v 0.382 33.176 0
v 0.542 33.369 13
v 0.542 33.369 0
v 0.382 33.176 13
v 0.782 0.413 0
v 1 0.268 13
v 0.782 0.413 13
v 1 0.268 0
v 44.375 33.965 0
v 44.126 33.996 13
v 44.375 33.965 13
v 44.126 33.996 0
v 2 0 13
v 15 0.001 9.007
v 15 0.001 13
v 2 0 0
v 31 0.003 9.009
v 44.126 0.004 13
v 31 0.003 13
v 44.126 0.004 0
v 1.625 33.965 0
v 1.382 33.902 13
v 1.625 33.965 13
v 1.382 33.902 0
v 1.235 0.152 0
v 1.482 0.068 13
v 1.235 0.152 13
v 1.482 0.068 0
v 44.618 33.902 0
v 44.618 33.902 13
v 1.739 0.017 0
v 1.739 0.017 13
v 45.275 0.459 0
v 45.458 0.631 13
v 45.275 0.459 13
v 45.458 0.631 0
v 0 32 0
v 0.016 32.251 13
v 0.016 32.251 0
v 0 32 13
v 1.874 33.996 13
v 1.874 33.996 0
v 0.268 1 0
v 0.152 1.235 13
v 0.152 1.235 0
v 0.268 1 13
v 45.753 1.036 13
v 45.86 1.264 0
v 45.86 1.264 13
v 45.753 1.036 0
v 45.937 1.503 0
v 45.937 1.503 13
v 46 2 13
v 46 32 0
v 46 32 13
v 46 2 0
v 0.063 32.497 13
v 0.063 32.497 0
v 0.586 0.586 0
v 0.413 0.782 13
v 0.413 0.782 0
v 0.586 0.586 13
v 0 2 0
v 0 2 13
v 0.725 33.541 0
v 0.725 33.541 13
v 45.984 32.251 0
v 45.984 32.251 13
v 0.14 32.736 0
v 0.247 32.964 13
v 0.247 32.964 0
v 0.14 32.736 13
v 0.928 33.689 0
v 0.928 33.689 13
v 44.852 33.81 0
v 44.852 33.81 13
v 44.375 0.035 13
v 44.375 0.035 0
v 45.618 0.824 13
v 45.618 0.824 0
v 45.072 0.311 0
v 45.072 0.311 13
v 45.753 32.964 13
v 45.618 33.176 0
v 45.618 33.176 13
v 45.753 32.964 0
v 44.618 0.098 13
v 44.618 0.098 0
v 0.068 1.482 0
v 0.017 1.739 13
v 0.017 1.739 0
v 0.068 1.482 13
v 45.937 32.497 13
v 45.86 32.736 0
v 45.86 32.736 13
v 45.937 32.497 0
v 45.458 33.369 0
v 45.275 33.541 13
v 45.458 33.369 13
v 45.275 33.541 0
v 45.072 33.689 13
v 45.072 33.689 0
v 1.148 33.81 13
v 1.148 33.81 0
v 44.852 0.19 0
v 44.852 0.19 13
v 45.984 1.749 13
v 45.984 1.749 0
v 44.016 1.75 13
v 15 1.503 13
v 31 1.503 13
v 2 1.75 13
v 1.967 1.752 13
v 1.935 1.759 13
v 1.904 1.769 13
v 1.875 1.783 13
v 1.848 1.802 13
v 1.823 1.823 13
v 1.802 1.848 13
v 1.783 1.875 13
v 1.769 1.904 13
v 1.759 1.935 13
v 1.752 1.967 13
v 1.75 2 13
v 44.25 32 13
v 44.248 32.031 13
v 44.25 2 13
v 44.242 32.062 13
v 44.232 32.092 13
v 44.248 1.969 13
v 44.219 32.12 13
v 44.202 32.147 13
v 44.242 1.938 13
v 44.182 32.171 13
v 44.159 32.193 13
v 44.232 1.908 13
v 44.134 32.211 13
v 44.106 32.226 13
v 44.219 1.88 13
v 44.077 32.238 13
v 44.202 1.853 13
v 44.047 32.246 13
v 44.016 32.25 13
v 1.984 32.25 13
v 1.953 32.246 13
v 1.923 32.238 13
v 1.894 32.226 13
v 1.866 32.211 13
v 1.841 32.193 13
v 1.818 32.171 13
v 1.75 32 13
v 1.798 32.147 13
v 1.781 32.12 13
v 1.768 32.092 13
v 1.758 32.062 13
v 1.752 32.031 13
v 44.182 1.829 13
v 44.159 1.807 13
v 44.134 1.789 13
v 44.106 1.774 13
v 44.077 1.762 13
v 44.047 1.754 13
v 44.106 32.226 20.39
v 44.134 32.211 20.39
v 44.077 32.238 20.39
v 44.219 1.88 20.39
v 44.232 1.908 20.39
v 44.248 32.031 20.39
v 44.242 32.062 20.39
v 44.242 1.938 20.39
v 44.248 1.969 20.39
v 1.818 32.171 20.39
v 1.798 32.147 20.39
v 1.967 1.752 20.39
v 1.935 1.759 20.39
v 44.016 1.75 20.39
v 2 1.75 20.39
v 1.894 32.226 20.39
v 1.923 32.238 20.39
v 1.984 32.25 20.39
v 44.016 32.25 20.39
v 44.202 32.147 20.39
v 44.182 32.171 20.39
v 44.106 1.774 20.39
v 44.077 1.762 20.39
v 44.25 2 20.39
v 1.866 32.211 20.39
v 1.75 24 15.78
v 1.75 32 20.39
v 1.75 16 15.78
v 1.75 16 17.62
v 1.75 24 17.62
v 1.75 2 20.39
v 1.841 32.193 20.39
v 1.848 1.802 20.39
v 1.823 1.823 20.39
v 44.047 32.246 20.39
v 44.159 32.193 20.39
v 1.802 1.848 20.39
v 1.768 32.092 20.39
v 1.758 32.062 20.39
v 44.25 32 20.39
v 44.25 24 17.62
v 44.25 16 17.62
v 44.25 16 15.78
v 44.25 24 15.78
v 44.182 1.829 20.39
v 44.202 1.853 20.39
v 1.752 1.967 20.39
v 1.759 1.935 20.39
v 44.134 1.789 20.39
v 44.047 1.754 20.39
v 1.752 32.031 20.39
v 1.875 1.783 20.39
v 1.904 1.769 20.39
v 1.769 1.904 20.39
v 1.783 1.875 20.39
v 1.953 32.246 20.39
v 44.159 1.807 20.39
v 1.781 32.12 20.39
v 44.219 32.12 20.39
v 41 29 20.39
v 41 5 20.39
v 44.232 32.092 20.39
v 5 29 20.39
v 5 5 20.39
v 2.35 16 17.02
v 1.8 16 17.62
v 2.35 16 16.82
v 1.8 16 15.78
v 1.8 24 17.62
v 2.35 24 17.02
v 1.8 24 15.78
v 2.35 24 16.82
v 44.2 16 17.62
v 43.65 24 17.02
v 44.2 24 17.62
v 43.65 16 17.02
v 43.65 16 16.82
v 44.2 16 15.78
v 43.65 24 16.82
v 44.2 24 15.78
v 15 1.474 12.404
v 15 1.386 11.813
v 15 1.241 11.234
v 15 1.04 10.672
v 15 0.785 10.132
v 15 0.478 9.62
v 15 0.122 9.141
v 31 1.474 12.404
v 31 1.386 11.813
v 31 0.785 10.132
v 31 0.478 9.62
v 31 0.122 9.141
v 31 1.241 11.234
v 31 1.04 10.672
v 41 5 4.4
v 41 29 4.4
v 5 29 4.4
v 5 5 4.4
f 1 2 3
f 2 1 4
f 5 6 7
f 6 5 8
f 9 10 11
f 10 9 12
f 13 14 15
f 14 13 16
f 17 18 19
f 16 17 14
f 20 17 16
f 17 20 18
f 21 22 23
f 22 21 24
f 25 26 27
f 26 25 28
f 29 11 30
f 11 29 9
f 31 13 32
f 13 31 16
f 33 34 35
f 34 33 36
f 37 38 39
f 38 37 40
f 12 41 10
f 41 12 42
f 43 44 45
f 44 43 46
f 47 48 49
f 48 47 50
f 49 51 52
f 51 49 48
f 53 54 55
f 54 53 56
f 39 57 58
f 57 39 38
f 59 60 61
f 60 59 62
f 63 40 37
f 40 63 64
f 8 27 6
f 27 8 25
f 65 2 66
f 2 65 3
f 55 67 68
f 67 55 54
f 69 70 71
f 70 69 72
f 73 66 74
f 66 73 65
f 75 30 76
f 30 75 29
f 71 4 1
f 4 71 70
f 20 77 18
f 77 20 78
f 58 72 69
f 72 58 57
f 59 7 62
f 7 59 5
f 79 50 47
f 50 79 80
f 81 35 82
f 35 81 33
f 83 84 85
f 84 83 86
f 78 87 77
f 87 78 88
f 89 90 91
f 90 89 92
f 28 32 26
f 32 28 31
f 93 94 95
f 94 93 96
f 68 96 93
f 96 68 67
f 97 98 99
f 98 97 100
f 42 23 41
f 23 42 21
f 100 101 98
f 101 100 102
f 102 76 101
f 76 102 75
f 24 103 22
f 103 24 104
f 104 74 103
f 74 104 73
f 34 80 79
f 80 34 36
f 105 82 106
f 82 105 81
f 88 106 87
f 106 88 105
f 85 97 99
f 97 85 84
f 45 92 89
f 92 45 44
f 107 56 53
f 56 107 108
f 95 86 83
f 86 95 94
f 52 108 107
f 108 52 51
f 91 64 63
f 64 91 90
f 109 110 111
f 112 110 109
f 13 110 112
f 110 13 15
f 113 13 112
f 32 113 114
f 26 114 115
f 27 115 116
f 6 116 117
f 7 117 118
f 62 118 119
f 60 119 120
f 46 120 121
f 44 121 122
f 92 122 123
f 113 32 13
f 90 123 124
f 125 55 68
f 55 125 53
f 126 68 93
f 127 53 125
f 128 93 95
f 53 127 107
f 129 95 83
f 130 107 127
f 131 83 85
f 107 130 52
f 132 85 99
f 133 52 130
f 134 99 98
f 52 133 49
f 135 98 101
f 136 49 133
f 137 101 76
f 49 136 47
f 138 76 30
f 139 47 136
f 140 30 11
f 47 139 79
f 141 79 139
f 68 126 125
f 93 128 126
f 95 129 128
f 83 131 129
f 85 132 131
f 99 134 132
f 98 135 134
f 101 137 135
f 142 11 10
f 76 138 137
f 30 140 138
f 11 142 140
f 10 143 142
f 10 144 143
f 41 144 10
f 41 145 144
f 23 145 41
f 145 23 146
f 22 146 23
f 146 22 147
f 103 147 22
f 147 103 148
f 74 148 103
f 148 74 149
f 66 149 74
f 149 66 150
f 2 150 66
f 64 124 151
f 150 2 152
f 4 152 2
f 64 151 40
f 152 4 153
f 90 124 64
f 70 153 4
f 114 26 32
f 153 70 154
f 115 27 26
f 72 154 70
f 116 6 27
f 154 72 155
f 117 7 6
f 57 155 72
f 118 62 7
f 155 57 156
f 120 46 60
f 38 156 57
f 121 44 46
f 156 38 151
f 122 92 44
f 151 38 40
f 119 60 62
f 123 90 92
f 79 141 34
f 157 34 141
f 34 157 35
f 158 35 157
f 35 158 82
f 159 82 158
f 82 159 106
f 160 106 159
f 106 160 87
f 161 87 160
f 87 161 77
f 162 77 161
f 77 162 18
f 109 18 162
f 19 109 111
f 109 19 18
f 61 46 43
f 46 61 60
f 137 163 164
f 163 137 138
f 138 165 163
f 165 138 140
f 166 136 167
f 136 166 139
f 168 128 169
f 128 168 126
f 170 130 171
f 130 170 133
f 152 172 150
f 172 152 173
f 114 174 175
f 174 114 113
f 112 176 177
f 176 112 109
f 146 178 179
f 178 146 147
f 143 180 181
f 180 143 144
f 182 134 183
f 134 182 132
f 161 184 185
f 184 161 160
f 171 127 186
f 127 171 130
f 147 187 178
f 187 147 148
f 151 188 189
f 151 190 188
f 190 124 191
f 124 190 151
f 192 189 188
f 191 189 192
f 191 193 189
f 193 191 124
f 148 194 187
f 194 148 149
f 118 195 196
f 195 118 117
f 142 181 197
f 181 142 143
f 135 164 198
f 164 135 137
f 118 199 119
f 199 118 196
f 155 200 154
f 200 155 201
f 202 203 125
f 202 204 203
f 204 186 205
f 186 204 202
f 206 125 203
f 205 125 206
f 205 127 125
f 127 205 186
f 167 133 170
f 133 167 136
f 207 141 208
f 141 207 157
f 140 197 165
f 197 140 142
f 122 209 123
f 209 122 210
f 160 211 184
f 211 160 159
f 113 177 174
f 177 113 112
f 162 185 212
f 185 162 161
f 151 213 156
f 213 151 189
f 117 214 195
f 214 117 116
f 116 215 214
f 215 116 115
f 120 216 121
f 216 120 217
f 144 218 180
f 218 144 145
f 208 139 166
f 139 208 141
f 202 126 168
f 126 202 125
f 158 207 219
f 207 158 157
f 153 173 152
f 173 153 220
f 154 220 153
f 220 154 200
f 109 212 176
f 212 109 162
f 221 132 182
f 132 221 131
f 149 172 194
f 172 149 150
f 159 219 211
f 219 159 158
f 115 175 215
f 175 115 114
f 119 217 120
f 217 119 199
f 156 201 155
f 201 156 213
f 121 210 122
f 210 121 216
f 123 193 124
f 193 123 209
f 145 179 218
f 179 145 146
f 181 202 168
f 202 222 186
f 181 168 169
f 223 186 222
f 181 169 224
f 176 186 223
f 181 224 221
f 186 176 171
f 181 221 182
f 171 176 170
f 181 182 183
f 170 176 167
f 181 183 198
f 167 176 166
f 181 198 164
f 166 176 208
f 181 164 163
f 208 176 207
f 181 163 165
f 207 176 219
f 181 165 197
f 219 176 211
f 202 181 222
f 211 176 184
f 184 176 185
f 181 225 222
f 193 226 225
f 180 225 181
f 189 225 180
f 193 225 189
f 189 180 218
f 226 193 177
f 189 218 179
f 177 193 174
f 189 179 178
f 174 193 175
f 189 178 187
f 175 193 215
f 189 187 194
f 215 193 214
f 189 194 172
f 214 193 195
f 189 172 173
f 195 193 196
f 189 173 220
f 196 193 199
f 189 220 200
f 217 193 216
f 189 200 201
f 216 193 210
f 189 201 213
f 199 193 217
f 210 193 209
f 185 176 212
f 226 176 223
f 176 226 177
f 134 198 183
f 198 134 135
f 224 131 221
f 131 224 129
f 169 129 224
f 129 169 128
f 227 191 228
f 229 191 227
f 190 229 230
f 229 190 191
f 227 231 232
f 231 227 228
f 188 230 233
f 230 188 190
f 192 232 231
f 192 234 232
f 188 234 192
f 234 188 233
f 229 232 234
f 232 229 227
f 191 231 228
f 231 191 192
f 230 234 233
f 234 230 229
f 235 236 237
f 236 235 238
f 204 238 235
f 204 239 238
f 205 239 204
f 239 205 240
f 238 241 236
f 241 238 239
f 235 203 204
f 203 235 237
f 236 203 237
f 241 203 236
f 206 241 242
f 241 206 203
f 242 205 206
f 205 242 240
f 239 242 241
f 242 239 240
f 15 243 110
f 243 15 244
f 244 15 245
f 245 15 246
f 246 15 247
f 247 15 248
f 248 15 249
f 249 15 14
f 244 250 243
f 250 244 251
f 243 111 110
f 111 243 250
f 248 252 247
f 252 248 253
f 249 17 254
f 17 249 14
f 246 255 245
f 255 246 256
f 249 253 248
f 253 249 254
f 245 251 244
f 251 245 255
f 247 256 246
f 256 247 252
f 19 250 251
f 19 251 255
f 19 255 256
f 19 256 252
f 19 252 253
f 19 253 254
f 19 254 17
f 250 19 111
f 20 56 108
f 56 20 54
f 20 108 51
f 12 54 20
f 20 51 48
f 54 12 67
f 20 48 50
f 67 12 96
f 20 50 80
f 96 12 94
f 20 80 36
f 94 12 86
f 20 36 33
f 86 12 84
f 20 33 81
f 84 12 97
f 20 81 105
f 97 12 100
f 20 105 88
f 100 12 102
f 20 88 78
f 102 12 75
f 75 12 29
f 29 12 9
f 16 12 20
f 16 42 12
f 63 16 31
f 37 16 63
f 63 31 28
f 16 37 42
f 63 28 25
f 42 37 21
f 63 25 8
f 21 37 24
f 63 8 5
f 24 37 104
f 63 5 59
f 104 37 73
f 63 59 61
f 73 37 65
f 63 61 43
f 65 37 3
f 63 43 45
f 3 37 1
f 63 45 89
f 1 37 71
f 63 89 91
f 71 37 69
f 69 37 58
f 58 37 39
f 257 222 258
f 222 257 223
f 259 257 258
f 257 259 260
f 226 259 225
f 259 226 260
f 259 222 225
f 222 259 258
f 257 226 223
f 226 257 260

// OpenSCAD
$fn=48;
translate([0,0,0])
{
difference()
{
    translate(v = [2.00, 2.00, 0.00])
    {
        hull()
        {
            cylinder(center = false, r1 = 2, r2 = 2, h = 22);
            translate(v = [42.00, 0.00, 0.00])
            {
                cylinder(center = false, r1 = 2, r2 = 2, h = 22, $fn = 50);
            }
            translate(v = [0.00, 30.00, 0.00])
            {
                cylinder(center = false, r1 = 2, r2 = 2, h = 22, $fn = 50);
            }
            translate(v = [42.00, 30.00, 0.00])
            {
                cylinder(center = false, r1 = 2, r2 = 2, h = 22, $fn = 50);
            }
        }
    }
    translate(v = [0.00, 0.00, 13.00])
    {
        union()
        {
            union()
            {
                difference()
                {
                    translate(v = [2.00, 2.00, 0.00])
                    {
                        hull()
                        {
                            cylinder(center = false, r1 = 2, r2 = 2, h = 9);
                            translate(v = [42.00, 0.00, 0.00])
                            {
                                cylinder(center = false, r1 = 2, r2 = 2, h = 9, $fn = 50);
                            }
                            translate(v = [0.00, 30.00, 0.00])
                            {
                                cylinder(center = false, r1 = 2, r2 = 2, h = 9, $fn = 50);
                            }
                            translate(v = [42.00, 30.00, 0.00])
                            {
                                cylinder(center = false, r1 = 2, r2 = 2, h = 9, $fn = 50);
                            }
                        }
                    }
                    translate(v = [1.75, 1.75, -0.01])
                    {
                        translate(v = [0.25, 0.25, 0.00])
                        {
                            hull()
                            {
                                cylinder(center = false, r1 = 0.25, r2 = 0.25, h = 7.4);
                                translate(v = [42.00, 0.00, 0.00])
                                {
                                    cylinder(center = false, r1 = 0.25, r2 = 0.25, h = 7.4, $fn = 50);
                                }
                                translate(v = [0.00, 30.00, 0.00])
                                {
                                    cylinder(center = false, r1 = 0.25, r2 = 0.25, h = 7.4, $fn = 50);
                                }
                                translate(v = [42.00, 30.00, 0.00])
                                {
                                    cylinder(center = false, r1 = 0.25, r2 = 0.25, h = 7.4, $fn = 50);
                                }
                            }
                        }
                    }
                }
                translate(v = [1.75, 24.00, 0.00])
                {
                    rotate([90.00, 0.00, 0.00])
                    {
                        hull()
                        {
                            translate(v = [0.00, 2.78, 0.00])
                            {
                                cube(size = [0.05, 1.84, 8.00], center = false); 
                            }
                            translate(v = [0.55, 3.82, 0.00])
                            {
                                cube(size = [0.05, 0.20, 8.00], center = false); 
                            }
                        }
                    }
                }
                translate(v = [44.25, 16.00, 0.00])
                {
                    rotate([90.00, 0.00, 180.00])
                    {
                        hull()
                        {
                            translate(v = [0.00, 2.78, 0.00])
                            {
                                cube(size = [0.05, 1.84, 8.00], center = false); 
                            }
                            translate(v = [0.55, 3.82, 0.00])
                            {
                                cube(size = [0.05, 0.20, 8.00], center = false); 
                            }
                        }
                    }
                }
            }
            translate(v = [15.00, 0.00, 0.00])
            {
                rotate([90.00, 0.00, 90.00])
                {
                    translate(v = [-4.58, 0.00, 0.00])
                    {
                        cylinder(center = false, r1 = 6.083333333333333, r2 = 6.083333333333333, h = 16, $fn = 64);
                    }
                }
            }
        }
    }
    translate(v = [5.00, 5.00, 4.40])
    {
        cube(size = [36.00, 24.00, 16.00], center = false); 
    }
}

}
